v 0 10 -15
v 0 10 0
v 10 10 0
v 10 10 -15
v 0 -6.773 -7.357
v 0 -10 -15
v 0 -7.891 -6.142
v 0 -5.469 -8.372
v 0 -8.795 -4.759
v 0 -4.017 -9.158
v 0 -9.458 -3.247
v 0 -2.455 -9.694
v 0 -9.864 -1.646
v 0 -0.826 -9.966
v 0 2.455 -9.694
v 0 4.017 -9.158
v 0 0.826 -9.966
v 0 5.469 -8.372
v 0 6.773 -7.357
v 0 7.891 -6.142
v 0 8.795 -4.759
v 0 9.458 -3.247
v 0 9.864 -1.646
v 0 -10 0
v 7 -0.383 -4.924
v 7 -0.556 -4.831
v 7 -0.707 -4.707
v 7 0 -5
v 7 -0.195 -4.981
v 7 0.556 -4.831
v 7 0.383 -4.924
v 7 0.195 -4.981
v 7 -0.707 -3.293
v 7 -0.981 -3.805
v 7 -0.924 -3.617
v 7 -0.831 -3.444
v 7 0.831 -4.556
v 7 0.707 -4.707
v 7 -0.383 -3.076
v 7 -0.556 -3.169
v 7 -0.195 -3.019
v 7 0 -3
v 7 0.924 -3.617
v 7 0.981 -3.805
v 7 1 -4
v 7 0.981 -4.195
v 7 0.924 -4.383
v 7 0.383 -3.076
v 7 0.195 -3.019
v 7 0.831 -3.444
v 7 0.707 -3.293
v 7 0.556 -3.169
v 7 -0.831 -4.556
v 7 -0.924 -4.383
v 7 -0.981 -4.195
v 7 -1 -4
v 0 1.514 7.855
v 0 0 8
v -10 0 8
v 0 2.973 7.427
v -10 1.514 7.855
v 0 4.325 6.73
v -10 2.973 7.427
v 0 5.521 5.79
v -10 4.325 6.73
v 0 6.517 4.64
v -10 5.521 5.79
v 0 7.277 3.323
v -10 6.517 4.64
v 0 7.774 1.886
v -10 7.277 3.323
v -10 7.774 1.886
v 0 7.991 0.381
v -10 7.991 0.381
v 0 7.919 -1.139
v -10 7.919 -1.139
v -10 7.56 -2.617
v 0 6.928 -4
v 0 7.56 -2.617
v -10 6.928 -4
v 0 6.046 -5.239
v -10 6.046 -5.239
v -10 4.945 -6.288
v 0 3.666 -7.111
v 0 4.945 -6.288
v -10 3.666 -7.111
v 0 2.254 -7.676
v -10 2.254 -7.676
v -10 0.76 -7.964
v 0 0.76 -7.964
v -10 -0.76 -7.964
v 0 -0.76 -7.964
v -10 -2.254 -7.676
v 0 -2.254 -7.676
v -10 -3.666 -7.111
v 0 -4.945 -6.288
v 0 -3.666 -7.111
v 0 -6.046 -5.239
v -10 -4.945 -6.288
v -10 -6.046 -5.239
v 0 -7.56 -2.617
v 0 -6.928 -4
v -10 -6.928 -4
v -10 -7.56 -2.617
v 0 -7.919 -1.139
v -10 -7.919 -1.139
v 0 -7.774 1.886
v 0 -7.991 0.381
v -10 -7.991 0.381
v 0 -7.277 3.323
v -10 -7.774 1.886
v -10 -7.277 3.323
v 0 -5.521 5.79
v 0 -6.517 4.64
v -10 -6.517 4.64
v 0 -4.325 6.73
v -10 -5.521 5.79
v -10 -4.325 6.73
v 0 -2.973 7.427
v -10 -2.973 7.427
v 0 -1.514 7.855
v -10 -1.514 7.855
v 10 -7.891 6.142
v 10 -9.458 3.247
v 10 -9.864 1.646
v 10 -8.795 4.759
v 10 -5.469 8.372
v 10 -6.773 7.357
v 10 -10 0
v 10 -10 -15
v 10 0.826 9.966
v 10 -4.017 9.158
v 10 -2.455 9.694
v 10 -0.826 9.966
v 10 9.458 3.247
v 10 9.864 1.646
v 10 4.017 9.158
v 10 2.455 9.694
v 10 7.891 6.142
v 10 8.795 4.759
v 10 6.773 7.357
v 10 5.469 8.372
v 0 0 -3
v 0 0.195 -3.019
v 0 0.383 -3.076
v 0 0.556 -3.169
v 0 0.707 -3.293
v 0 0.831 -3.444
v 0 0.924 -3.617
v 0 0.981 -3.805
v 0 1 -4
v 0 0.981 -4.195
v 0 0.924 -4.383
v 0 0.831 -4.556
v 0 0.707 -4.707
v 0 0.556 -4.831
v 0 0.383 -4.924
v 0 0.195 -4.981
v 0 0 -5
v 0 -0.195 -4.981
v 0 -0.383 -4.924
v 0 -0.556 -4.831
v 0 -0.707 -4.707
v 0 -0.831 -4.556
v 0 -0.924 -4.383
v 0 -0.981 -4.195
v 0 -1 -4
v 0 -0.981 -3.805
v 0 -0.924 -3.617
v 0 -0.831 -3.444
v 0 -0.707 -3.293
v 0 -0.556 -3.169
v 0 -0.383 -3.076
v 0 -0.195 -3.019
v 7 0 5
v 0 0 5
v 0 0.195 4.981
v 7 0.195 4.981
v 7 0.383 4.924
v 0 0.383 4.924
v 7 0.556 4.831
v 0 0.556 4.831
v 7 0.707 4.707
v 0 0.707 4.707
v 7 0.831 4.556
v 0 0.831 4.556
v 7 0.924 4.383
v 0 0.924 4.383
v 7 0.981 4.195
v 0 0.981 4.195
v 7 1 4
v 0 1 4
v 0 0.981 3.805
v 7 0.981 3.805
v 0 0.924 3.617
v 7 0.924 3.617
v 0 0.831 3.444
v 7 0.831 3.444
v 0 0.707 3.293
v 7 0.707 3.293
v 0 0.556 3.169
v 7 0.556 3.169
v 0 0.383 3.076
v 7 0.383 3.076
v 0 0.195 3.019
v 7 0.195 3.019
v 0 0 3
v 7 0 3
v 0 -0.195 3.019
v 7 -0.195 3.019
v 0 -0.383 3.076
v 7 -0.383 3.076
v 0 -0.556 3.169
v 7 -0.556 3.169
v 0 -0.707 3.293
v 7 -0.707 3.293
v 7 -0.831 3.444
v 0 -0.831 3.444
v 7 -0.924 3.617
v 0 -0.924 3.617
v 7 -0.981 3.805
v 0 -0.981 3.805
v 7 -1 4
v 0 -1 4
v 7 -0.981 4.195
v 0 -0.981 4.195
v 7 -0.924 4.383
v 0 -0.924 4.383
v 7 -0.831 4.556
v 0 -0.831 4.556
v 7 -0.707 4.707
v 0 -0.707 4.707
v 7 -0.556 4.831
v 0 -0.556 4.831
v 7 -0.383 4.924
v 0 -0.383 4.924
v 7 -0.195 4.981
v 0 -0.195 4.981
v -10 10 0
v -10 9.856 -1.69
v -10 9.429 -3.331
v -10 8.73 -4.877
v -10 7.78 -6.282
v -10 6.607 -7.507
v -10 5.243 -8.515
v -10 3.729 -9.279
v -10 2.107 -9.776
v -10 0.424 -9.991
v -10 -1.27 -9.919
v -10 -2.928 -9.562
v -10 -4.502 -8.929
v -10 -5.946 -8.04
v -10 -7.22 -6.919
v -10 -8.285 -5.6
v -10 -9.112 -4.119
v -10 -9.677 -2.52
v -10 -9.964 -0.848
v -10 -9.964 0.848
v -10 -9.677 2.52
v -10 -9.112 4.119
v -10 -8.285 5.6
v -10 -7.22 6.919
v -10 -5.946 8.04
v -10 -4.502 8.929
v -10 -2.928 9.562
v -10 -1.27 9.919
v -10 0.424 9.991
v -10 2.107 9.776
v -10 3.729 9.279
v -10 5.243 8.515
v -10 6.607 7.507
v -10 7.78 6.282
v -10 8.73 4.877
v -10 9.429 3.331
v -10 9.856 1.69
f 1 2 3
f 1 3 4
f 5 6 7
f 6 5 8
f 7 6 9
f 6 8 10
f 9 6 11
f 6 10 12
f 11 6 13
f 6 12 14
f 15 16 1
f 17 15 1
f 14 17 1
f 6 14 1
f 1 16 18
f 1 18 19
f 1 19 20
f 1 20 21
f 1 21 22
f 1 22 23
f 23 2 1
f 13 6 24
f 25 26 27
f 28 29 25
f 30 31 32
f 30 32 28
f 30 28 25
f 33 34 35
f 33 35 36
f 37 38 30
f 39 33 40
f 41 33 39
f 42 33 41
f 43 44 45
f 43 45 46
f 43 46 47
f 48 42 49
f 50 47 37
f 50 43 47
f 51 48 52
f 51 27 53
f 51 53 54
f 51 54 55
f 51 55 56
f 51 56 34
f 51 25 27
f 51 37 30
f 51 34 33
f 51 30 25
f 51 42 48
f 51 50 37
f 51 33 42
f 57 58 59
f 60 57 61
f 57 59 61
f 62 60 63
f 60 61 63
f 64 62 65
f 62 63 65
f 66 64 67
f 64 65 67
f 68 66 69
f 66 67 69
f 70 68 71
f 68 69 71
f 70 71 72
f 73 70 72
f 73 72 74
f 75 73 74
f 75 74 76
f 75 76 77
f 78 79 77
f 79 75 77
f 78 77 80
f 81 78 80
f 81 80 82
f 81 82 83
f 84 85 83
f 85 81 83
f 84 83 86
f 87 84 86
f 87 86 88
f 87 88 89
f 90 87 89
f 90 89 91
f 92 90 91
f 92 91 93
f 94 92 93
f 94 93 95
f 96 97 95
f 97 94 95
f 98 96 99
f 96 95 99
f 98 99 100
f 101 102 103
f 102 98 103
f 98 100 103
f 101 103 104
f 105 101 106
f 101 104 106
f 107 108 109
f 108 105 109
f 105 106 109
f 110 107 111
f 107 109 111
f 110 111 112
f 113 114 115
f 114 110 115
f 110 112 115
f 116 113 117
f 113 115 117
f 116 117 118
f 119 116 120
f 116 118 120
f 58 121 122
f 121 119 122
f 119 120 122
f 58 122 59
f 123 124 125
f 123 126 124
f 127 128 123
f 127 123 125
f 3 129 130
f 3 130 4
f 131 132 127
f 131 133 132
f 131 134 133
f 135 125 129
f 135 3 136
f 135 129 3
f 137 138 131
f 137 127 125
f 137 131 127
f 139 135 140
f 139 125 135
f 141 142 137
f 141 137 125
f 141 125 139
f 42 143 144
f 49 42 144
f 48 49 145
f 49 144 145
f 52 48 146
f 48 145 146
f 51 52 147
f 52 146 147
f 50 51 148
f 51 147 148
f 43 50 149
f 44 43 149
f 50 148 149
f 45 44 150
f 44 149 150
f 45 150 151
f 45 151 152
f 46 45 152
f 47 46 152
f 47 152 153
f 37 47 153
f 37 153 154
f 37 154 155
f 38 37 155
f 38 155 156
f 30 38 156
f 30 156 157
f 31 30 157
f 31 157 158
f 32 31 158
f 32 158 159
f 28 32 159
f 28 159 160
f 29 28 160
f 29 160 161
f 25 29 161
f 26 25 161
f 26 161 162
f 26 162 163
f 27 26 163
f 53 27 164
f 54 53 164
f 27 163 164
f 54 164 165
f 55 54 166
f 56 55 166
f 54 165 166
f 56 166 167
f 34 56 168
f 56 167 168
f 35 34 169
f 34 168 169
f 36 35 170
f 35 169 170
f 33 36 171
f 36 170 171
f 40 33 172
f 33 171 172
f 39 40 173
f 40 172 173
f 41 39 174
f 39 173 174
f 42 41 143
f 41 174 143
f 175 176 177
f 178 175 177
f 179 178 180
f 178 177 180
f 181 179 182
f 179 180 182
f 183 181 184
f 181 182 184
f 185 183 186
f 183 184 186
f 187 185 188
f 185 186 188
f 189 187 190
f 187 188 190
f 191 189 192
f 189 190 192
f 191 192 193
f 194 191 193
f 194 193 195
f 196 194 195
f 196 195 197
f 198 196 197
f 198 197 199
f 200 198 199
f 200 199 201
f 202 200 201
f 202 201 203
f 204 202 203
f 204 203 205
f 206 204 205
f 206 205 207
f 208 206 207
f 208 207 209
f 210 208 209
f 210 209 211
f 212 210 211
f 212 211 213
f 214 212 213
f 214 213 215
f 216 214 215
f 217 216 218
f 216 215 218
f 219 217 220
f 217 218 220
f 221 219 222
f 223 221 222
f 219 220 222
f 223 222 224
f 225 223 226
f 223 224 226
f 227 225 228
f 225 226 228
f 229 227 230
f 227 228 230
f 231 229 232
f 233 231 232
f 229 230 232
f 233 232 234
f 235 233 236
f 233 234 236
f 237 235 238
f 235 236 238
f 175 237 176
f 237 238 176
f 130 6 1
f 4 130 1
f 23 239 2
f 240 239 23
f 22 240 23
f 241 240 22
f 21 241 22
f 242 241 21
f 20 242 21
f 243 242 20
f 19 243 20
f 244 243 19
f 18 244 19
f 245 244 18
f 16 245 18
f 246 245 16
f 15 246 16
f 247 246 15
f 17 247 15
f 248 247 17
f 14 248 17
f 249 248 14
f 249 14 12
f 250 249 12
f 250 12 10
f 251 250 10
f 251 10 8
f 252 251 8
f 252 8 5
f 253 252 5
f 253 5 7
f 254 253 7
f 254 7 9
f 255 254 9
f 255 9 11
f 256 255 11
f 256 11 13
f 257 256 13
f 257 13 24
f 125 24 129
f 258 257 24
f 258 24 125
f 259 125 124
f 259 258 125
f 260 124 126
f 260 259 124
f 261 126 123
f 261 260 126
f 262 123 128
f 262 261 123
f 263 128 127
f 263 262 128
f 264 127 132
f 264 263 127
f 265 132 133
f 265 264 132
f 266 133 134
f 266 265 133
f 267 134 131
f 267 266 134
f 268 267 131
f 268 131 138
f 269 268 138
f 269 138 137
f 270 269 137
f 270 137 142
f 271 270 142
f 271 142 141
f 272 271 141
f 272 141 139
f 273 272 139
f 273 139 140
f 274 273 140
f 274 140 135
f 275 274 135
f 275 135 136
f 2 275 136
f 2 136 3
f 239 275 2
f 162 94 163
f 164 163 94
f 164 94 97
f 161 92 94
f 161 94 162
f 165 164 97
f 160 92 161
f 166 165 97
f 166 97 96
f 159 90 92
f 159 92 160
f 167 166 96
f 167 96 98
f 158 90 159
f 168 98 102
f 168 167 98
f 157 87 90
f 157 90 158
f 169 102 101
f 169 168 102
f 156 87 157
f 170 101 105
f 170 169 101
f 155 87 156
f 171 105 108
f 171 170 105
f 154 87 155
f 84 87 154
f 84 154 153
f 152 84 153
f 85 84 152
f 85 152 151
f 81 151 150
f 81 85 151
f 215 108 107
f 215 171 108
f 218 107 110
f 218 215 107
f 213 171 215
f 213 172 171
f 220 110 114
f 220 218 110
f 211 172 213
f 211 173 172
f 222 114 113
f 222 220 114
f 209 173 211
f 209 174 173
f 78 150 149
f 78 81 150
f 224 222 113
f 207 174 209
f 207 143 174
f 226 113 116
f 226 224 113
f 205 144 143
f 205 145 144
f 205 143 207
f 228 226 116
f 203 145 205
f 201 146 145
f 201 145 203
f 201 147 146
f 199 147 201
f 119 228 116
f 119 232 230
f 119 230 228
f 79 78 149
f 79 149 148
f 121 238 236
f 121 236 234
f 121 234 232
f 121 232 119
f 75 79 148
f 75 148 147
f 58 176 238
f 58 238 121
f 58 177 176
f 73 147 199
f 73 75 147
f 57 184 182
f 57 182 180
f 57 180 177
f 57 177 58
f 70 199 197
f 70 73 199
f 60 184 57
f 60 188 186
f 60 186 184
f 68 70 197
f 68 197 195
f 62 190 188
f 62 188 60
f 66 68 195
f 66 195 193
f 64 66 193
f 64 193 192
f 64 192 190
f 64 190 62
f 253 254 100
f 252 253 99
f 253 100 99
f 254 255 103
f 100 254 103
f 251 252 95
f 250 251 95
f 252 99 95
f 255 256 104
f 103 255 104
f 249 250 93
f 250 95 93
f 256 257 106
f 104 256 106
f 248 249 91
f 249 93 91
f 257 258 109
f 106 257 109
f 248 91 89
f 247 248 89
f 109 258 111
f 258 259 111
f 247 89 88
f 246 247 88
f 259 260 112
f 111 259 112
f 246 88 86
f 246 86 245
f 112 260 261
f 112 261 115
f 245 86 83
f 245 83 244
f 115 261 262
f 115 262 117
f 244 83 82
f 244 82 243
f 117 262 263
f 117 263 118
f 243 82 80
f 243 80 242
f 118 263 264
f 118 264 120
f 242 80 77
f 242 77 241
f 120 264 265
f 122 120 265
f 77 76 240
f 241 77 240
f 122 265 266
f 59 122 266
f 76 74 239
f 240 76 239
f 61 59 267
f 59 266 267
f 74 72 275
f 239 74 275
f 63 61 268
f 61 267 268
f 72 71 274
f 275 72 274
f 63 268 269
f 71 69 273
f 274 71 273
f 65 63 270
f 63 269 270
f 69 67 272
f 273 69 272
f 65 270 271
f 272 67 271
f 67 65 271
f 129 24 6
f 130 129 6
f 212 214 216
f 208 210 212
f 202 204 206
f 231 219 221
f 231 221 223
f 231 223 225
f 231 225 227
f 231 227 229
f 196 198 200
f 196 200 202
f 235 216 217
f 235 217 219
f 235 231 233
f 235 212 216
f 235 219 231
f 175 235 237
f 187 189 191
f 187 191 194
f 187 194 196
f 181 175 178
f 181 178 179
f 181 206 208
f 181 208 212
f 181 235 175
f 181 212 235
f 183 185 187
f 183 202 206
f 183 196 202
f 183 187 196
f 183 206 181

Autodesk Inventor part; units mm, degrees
ref_plane "YZ Plane" through (0, 0, 0) normal (1, 0, 0) x (0, 1, 0)
ref_plane "XZ Plane" through (0, 0, 0) normal (0, 1, 0) x (-1, 0, 0)
ref_plane "XY Plane" through (0, 0, 0) normal (0, 0, 1) x (1, 0, 0)
sketch "Szkic1" plane through (0, 0, 0) normal (1, 0, 0) x (0, 1, 0)
  circle A0 centre (0, 0) radius 10
  line L0 (-14, 0) -> (14, 0) projected
  line L1 (0, -20) -> (0, 15) projected
  line L2 (10, 0) -> (10, -15)
  line L3 (-10, -15) -> (10, -15)
  line L4 (-10, 0) -> (-10, -15)
  dimension "d0" = 20
  dimension "d3" = 15
extrude "Wyciągnięcie proste2" add sketch "Szkic1" along normal blind 10
extrude "Wyciągnięcie proste3" add sketch "Szkic1" against normal blind 10 contours L0 L1 A0 | A0 L1 L0 | L1 L0 A0 | A0 L0 L1
sketch "Szkic2" plane through (-10, 0, 0) normal (-1, 0, 0) x (0, 0, 1)
  circle A0 centre (0, 0) radius 10 projected
  circle A1 centre (0, 0) radius 8
  line L0 (-20, 0) -> (15, 0) projected
  line L1 (0, -14) -> (0, 14) projected
  circle A2 centre (-4, 0) radius 1
  circle A3 centre (4, 0) radius 1
  dimension "d8" = 16
  dimension "d9" = 2
  dimension "d12" = 8
extrude "Wyciągnięcie proste4" cut sketch "Szkic2" against normal blind 10 contours L0 A3 L1 A1 | A1 L1 L0 A3 | L1 L0 A2 A1 | A1 L0 A2 L1
extrude "Wyciągnięcie proste5" cut sketch "Szkic2" against normal blind 17 contours A3 L0 | L0 A3 | A2 L0 | L0 A2
equation "\"d12\" = 0.5 * d8"
properties part number "uchwytG5"
